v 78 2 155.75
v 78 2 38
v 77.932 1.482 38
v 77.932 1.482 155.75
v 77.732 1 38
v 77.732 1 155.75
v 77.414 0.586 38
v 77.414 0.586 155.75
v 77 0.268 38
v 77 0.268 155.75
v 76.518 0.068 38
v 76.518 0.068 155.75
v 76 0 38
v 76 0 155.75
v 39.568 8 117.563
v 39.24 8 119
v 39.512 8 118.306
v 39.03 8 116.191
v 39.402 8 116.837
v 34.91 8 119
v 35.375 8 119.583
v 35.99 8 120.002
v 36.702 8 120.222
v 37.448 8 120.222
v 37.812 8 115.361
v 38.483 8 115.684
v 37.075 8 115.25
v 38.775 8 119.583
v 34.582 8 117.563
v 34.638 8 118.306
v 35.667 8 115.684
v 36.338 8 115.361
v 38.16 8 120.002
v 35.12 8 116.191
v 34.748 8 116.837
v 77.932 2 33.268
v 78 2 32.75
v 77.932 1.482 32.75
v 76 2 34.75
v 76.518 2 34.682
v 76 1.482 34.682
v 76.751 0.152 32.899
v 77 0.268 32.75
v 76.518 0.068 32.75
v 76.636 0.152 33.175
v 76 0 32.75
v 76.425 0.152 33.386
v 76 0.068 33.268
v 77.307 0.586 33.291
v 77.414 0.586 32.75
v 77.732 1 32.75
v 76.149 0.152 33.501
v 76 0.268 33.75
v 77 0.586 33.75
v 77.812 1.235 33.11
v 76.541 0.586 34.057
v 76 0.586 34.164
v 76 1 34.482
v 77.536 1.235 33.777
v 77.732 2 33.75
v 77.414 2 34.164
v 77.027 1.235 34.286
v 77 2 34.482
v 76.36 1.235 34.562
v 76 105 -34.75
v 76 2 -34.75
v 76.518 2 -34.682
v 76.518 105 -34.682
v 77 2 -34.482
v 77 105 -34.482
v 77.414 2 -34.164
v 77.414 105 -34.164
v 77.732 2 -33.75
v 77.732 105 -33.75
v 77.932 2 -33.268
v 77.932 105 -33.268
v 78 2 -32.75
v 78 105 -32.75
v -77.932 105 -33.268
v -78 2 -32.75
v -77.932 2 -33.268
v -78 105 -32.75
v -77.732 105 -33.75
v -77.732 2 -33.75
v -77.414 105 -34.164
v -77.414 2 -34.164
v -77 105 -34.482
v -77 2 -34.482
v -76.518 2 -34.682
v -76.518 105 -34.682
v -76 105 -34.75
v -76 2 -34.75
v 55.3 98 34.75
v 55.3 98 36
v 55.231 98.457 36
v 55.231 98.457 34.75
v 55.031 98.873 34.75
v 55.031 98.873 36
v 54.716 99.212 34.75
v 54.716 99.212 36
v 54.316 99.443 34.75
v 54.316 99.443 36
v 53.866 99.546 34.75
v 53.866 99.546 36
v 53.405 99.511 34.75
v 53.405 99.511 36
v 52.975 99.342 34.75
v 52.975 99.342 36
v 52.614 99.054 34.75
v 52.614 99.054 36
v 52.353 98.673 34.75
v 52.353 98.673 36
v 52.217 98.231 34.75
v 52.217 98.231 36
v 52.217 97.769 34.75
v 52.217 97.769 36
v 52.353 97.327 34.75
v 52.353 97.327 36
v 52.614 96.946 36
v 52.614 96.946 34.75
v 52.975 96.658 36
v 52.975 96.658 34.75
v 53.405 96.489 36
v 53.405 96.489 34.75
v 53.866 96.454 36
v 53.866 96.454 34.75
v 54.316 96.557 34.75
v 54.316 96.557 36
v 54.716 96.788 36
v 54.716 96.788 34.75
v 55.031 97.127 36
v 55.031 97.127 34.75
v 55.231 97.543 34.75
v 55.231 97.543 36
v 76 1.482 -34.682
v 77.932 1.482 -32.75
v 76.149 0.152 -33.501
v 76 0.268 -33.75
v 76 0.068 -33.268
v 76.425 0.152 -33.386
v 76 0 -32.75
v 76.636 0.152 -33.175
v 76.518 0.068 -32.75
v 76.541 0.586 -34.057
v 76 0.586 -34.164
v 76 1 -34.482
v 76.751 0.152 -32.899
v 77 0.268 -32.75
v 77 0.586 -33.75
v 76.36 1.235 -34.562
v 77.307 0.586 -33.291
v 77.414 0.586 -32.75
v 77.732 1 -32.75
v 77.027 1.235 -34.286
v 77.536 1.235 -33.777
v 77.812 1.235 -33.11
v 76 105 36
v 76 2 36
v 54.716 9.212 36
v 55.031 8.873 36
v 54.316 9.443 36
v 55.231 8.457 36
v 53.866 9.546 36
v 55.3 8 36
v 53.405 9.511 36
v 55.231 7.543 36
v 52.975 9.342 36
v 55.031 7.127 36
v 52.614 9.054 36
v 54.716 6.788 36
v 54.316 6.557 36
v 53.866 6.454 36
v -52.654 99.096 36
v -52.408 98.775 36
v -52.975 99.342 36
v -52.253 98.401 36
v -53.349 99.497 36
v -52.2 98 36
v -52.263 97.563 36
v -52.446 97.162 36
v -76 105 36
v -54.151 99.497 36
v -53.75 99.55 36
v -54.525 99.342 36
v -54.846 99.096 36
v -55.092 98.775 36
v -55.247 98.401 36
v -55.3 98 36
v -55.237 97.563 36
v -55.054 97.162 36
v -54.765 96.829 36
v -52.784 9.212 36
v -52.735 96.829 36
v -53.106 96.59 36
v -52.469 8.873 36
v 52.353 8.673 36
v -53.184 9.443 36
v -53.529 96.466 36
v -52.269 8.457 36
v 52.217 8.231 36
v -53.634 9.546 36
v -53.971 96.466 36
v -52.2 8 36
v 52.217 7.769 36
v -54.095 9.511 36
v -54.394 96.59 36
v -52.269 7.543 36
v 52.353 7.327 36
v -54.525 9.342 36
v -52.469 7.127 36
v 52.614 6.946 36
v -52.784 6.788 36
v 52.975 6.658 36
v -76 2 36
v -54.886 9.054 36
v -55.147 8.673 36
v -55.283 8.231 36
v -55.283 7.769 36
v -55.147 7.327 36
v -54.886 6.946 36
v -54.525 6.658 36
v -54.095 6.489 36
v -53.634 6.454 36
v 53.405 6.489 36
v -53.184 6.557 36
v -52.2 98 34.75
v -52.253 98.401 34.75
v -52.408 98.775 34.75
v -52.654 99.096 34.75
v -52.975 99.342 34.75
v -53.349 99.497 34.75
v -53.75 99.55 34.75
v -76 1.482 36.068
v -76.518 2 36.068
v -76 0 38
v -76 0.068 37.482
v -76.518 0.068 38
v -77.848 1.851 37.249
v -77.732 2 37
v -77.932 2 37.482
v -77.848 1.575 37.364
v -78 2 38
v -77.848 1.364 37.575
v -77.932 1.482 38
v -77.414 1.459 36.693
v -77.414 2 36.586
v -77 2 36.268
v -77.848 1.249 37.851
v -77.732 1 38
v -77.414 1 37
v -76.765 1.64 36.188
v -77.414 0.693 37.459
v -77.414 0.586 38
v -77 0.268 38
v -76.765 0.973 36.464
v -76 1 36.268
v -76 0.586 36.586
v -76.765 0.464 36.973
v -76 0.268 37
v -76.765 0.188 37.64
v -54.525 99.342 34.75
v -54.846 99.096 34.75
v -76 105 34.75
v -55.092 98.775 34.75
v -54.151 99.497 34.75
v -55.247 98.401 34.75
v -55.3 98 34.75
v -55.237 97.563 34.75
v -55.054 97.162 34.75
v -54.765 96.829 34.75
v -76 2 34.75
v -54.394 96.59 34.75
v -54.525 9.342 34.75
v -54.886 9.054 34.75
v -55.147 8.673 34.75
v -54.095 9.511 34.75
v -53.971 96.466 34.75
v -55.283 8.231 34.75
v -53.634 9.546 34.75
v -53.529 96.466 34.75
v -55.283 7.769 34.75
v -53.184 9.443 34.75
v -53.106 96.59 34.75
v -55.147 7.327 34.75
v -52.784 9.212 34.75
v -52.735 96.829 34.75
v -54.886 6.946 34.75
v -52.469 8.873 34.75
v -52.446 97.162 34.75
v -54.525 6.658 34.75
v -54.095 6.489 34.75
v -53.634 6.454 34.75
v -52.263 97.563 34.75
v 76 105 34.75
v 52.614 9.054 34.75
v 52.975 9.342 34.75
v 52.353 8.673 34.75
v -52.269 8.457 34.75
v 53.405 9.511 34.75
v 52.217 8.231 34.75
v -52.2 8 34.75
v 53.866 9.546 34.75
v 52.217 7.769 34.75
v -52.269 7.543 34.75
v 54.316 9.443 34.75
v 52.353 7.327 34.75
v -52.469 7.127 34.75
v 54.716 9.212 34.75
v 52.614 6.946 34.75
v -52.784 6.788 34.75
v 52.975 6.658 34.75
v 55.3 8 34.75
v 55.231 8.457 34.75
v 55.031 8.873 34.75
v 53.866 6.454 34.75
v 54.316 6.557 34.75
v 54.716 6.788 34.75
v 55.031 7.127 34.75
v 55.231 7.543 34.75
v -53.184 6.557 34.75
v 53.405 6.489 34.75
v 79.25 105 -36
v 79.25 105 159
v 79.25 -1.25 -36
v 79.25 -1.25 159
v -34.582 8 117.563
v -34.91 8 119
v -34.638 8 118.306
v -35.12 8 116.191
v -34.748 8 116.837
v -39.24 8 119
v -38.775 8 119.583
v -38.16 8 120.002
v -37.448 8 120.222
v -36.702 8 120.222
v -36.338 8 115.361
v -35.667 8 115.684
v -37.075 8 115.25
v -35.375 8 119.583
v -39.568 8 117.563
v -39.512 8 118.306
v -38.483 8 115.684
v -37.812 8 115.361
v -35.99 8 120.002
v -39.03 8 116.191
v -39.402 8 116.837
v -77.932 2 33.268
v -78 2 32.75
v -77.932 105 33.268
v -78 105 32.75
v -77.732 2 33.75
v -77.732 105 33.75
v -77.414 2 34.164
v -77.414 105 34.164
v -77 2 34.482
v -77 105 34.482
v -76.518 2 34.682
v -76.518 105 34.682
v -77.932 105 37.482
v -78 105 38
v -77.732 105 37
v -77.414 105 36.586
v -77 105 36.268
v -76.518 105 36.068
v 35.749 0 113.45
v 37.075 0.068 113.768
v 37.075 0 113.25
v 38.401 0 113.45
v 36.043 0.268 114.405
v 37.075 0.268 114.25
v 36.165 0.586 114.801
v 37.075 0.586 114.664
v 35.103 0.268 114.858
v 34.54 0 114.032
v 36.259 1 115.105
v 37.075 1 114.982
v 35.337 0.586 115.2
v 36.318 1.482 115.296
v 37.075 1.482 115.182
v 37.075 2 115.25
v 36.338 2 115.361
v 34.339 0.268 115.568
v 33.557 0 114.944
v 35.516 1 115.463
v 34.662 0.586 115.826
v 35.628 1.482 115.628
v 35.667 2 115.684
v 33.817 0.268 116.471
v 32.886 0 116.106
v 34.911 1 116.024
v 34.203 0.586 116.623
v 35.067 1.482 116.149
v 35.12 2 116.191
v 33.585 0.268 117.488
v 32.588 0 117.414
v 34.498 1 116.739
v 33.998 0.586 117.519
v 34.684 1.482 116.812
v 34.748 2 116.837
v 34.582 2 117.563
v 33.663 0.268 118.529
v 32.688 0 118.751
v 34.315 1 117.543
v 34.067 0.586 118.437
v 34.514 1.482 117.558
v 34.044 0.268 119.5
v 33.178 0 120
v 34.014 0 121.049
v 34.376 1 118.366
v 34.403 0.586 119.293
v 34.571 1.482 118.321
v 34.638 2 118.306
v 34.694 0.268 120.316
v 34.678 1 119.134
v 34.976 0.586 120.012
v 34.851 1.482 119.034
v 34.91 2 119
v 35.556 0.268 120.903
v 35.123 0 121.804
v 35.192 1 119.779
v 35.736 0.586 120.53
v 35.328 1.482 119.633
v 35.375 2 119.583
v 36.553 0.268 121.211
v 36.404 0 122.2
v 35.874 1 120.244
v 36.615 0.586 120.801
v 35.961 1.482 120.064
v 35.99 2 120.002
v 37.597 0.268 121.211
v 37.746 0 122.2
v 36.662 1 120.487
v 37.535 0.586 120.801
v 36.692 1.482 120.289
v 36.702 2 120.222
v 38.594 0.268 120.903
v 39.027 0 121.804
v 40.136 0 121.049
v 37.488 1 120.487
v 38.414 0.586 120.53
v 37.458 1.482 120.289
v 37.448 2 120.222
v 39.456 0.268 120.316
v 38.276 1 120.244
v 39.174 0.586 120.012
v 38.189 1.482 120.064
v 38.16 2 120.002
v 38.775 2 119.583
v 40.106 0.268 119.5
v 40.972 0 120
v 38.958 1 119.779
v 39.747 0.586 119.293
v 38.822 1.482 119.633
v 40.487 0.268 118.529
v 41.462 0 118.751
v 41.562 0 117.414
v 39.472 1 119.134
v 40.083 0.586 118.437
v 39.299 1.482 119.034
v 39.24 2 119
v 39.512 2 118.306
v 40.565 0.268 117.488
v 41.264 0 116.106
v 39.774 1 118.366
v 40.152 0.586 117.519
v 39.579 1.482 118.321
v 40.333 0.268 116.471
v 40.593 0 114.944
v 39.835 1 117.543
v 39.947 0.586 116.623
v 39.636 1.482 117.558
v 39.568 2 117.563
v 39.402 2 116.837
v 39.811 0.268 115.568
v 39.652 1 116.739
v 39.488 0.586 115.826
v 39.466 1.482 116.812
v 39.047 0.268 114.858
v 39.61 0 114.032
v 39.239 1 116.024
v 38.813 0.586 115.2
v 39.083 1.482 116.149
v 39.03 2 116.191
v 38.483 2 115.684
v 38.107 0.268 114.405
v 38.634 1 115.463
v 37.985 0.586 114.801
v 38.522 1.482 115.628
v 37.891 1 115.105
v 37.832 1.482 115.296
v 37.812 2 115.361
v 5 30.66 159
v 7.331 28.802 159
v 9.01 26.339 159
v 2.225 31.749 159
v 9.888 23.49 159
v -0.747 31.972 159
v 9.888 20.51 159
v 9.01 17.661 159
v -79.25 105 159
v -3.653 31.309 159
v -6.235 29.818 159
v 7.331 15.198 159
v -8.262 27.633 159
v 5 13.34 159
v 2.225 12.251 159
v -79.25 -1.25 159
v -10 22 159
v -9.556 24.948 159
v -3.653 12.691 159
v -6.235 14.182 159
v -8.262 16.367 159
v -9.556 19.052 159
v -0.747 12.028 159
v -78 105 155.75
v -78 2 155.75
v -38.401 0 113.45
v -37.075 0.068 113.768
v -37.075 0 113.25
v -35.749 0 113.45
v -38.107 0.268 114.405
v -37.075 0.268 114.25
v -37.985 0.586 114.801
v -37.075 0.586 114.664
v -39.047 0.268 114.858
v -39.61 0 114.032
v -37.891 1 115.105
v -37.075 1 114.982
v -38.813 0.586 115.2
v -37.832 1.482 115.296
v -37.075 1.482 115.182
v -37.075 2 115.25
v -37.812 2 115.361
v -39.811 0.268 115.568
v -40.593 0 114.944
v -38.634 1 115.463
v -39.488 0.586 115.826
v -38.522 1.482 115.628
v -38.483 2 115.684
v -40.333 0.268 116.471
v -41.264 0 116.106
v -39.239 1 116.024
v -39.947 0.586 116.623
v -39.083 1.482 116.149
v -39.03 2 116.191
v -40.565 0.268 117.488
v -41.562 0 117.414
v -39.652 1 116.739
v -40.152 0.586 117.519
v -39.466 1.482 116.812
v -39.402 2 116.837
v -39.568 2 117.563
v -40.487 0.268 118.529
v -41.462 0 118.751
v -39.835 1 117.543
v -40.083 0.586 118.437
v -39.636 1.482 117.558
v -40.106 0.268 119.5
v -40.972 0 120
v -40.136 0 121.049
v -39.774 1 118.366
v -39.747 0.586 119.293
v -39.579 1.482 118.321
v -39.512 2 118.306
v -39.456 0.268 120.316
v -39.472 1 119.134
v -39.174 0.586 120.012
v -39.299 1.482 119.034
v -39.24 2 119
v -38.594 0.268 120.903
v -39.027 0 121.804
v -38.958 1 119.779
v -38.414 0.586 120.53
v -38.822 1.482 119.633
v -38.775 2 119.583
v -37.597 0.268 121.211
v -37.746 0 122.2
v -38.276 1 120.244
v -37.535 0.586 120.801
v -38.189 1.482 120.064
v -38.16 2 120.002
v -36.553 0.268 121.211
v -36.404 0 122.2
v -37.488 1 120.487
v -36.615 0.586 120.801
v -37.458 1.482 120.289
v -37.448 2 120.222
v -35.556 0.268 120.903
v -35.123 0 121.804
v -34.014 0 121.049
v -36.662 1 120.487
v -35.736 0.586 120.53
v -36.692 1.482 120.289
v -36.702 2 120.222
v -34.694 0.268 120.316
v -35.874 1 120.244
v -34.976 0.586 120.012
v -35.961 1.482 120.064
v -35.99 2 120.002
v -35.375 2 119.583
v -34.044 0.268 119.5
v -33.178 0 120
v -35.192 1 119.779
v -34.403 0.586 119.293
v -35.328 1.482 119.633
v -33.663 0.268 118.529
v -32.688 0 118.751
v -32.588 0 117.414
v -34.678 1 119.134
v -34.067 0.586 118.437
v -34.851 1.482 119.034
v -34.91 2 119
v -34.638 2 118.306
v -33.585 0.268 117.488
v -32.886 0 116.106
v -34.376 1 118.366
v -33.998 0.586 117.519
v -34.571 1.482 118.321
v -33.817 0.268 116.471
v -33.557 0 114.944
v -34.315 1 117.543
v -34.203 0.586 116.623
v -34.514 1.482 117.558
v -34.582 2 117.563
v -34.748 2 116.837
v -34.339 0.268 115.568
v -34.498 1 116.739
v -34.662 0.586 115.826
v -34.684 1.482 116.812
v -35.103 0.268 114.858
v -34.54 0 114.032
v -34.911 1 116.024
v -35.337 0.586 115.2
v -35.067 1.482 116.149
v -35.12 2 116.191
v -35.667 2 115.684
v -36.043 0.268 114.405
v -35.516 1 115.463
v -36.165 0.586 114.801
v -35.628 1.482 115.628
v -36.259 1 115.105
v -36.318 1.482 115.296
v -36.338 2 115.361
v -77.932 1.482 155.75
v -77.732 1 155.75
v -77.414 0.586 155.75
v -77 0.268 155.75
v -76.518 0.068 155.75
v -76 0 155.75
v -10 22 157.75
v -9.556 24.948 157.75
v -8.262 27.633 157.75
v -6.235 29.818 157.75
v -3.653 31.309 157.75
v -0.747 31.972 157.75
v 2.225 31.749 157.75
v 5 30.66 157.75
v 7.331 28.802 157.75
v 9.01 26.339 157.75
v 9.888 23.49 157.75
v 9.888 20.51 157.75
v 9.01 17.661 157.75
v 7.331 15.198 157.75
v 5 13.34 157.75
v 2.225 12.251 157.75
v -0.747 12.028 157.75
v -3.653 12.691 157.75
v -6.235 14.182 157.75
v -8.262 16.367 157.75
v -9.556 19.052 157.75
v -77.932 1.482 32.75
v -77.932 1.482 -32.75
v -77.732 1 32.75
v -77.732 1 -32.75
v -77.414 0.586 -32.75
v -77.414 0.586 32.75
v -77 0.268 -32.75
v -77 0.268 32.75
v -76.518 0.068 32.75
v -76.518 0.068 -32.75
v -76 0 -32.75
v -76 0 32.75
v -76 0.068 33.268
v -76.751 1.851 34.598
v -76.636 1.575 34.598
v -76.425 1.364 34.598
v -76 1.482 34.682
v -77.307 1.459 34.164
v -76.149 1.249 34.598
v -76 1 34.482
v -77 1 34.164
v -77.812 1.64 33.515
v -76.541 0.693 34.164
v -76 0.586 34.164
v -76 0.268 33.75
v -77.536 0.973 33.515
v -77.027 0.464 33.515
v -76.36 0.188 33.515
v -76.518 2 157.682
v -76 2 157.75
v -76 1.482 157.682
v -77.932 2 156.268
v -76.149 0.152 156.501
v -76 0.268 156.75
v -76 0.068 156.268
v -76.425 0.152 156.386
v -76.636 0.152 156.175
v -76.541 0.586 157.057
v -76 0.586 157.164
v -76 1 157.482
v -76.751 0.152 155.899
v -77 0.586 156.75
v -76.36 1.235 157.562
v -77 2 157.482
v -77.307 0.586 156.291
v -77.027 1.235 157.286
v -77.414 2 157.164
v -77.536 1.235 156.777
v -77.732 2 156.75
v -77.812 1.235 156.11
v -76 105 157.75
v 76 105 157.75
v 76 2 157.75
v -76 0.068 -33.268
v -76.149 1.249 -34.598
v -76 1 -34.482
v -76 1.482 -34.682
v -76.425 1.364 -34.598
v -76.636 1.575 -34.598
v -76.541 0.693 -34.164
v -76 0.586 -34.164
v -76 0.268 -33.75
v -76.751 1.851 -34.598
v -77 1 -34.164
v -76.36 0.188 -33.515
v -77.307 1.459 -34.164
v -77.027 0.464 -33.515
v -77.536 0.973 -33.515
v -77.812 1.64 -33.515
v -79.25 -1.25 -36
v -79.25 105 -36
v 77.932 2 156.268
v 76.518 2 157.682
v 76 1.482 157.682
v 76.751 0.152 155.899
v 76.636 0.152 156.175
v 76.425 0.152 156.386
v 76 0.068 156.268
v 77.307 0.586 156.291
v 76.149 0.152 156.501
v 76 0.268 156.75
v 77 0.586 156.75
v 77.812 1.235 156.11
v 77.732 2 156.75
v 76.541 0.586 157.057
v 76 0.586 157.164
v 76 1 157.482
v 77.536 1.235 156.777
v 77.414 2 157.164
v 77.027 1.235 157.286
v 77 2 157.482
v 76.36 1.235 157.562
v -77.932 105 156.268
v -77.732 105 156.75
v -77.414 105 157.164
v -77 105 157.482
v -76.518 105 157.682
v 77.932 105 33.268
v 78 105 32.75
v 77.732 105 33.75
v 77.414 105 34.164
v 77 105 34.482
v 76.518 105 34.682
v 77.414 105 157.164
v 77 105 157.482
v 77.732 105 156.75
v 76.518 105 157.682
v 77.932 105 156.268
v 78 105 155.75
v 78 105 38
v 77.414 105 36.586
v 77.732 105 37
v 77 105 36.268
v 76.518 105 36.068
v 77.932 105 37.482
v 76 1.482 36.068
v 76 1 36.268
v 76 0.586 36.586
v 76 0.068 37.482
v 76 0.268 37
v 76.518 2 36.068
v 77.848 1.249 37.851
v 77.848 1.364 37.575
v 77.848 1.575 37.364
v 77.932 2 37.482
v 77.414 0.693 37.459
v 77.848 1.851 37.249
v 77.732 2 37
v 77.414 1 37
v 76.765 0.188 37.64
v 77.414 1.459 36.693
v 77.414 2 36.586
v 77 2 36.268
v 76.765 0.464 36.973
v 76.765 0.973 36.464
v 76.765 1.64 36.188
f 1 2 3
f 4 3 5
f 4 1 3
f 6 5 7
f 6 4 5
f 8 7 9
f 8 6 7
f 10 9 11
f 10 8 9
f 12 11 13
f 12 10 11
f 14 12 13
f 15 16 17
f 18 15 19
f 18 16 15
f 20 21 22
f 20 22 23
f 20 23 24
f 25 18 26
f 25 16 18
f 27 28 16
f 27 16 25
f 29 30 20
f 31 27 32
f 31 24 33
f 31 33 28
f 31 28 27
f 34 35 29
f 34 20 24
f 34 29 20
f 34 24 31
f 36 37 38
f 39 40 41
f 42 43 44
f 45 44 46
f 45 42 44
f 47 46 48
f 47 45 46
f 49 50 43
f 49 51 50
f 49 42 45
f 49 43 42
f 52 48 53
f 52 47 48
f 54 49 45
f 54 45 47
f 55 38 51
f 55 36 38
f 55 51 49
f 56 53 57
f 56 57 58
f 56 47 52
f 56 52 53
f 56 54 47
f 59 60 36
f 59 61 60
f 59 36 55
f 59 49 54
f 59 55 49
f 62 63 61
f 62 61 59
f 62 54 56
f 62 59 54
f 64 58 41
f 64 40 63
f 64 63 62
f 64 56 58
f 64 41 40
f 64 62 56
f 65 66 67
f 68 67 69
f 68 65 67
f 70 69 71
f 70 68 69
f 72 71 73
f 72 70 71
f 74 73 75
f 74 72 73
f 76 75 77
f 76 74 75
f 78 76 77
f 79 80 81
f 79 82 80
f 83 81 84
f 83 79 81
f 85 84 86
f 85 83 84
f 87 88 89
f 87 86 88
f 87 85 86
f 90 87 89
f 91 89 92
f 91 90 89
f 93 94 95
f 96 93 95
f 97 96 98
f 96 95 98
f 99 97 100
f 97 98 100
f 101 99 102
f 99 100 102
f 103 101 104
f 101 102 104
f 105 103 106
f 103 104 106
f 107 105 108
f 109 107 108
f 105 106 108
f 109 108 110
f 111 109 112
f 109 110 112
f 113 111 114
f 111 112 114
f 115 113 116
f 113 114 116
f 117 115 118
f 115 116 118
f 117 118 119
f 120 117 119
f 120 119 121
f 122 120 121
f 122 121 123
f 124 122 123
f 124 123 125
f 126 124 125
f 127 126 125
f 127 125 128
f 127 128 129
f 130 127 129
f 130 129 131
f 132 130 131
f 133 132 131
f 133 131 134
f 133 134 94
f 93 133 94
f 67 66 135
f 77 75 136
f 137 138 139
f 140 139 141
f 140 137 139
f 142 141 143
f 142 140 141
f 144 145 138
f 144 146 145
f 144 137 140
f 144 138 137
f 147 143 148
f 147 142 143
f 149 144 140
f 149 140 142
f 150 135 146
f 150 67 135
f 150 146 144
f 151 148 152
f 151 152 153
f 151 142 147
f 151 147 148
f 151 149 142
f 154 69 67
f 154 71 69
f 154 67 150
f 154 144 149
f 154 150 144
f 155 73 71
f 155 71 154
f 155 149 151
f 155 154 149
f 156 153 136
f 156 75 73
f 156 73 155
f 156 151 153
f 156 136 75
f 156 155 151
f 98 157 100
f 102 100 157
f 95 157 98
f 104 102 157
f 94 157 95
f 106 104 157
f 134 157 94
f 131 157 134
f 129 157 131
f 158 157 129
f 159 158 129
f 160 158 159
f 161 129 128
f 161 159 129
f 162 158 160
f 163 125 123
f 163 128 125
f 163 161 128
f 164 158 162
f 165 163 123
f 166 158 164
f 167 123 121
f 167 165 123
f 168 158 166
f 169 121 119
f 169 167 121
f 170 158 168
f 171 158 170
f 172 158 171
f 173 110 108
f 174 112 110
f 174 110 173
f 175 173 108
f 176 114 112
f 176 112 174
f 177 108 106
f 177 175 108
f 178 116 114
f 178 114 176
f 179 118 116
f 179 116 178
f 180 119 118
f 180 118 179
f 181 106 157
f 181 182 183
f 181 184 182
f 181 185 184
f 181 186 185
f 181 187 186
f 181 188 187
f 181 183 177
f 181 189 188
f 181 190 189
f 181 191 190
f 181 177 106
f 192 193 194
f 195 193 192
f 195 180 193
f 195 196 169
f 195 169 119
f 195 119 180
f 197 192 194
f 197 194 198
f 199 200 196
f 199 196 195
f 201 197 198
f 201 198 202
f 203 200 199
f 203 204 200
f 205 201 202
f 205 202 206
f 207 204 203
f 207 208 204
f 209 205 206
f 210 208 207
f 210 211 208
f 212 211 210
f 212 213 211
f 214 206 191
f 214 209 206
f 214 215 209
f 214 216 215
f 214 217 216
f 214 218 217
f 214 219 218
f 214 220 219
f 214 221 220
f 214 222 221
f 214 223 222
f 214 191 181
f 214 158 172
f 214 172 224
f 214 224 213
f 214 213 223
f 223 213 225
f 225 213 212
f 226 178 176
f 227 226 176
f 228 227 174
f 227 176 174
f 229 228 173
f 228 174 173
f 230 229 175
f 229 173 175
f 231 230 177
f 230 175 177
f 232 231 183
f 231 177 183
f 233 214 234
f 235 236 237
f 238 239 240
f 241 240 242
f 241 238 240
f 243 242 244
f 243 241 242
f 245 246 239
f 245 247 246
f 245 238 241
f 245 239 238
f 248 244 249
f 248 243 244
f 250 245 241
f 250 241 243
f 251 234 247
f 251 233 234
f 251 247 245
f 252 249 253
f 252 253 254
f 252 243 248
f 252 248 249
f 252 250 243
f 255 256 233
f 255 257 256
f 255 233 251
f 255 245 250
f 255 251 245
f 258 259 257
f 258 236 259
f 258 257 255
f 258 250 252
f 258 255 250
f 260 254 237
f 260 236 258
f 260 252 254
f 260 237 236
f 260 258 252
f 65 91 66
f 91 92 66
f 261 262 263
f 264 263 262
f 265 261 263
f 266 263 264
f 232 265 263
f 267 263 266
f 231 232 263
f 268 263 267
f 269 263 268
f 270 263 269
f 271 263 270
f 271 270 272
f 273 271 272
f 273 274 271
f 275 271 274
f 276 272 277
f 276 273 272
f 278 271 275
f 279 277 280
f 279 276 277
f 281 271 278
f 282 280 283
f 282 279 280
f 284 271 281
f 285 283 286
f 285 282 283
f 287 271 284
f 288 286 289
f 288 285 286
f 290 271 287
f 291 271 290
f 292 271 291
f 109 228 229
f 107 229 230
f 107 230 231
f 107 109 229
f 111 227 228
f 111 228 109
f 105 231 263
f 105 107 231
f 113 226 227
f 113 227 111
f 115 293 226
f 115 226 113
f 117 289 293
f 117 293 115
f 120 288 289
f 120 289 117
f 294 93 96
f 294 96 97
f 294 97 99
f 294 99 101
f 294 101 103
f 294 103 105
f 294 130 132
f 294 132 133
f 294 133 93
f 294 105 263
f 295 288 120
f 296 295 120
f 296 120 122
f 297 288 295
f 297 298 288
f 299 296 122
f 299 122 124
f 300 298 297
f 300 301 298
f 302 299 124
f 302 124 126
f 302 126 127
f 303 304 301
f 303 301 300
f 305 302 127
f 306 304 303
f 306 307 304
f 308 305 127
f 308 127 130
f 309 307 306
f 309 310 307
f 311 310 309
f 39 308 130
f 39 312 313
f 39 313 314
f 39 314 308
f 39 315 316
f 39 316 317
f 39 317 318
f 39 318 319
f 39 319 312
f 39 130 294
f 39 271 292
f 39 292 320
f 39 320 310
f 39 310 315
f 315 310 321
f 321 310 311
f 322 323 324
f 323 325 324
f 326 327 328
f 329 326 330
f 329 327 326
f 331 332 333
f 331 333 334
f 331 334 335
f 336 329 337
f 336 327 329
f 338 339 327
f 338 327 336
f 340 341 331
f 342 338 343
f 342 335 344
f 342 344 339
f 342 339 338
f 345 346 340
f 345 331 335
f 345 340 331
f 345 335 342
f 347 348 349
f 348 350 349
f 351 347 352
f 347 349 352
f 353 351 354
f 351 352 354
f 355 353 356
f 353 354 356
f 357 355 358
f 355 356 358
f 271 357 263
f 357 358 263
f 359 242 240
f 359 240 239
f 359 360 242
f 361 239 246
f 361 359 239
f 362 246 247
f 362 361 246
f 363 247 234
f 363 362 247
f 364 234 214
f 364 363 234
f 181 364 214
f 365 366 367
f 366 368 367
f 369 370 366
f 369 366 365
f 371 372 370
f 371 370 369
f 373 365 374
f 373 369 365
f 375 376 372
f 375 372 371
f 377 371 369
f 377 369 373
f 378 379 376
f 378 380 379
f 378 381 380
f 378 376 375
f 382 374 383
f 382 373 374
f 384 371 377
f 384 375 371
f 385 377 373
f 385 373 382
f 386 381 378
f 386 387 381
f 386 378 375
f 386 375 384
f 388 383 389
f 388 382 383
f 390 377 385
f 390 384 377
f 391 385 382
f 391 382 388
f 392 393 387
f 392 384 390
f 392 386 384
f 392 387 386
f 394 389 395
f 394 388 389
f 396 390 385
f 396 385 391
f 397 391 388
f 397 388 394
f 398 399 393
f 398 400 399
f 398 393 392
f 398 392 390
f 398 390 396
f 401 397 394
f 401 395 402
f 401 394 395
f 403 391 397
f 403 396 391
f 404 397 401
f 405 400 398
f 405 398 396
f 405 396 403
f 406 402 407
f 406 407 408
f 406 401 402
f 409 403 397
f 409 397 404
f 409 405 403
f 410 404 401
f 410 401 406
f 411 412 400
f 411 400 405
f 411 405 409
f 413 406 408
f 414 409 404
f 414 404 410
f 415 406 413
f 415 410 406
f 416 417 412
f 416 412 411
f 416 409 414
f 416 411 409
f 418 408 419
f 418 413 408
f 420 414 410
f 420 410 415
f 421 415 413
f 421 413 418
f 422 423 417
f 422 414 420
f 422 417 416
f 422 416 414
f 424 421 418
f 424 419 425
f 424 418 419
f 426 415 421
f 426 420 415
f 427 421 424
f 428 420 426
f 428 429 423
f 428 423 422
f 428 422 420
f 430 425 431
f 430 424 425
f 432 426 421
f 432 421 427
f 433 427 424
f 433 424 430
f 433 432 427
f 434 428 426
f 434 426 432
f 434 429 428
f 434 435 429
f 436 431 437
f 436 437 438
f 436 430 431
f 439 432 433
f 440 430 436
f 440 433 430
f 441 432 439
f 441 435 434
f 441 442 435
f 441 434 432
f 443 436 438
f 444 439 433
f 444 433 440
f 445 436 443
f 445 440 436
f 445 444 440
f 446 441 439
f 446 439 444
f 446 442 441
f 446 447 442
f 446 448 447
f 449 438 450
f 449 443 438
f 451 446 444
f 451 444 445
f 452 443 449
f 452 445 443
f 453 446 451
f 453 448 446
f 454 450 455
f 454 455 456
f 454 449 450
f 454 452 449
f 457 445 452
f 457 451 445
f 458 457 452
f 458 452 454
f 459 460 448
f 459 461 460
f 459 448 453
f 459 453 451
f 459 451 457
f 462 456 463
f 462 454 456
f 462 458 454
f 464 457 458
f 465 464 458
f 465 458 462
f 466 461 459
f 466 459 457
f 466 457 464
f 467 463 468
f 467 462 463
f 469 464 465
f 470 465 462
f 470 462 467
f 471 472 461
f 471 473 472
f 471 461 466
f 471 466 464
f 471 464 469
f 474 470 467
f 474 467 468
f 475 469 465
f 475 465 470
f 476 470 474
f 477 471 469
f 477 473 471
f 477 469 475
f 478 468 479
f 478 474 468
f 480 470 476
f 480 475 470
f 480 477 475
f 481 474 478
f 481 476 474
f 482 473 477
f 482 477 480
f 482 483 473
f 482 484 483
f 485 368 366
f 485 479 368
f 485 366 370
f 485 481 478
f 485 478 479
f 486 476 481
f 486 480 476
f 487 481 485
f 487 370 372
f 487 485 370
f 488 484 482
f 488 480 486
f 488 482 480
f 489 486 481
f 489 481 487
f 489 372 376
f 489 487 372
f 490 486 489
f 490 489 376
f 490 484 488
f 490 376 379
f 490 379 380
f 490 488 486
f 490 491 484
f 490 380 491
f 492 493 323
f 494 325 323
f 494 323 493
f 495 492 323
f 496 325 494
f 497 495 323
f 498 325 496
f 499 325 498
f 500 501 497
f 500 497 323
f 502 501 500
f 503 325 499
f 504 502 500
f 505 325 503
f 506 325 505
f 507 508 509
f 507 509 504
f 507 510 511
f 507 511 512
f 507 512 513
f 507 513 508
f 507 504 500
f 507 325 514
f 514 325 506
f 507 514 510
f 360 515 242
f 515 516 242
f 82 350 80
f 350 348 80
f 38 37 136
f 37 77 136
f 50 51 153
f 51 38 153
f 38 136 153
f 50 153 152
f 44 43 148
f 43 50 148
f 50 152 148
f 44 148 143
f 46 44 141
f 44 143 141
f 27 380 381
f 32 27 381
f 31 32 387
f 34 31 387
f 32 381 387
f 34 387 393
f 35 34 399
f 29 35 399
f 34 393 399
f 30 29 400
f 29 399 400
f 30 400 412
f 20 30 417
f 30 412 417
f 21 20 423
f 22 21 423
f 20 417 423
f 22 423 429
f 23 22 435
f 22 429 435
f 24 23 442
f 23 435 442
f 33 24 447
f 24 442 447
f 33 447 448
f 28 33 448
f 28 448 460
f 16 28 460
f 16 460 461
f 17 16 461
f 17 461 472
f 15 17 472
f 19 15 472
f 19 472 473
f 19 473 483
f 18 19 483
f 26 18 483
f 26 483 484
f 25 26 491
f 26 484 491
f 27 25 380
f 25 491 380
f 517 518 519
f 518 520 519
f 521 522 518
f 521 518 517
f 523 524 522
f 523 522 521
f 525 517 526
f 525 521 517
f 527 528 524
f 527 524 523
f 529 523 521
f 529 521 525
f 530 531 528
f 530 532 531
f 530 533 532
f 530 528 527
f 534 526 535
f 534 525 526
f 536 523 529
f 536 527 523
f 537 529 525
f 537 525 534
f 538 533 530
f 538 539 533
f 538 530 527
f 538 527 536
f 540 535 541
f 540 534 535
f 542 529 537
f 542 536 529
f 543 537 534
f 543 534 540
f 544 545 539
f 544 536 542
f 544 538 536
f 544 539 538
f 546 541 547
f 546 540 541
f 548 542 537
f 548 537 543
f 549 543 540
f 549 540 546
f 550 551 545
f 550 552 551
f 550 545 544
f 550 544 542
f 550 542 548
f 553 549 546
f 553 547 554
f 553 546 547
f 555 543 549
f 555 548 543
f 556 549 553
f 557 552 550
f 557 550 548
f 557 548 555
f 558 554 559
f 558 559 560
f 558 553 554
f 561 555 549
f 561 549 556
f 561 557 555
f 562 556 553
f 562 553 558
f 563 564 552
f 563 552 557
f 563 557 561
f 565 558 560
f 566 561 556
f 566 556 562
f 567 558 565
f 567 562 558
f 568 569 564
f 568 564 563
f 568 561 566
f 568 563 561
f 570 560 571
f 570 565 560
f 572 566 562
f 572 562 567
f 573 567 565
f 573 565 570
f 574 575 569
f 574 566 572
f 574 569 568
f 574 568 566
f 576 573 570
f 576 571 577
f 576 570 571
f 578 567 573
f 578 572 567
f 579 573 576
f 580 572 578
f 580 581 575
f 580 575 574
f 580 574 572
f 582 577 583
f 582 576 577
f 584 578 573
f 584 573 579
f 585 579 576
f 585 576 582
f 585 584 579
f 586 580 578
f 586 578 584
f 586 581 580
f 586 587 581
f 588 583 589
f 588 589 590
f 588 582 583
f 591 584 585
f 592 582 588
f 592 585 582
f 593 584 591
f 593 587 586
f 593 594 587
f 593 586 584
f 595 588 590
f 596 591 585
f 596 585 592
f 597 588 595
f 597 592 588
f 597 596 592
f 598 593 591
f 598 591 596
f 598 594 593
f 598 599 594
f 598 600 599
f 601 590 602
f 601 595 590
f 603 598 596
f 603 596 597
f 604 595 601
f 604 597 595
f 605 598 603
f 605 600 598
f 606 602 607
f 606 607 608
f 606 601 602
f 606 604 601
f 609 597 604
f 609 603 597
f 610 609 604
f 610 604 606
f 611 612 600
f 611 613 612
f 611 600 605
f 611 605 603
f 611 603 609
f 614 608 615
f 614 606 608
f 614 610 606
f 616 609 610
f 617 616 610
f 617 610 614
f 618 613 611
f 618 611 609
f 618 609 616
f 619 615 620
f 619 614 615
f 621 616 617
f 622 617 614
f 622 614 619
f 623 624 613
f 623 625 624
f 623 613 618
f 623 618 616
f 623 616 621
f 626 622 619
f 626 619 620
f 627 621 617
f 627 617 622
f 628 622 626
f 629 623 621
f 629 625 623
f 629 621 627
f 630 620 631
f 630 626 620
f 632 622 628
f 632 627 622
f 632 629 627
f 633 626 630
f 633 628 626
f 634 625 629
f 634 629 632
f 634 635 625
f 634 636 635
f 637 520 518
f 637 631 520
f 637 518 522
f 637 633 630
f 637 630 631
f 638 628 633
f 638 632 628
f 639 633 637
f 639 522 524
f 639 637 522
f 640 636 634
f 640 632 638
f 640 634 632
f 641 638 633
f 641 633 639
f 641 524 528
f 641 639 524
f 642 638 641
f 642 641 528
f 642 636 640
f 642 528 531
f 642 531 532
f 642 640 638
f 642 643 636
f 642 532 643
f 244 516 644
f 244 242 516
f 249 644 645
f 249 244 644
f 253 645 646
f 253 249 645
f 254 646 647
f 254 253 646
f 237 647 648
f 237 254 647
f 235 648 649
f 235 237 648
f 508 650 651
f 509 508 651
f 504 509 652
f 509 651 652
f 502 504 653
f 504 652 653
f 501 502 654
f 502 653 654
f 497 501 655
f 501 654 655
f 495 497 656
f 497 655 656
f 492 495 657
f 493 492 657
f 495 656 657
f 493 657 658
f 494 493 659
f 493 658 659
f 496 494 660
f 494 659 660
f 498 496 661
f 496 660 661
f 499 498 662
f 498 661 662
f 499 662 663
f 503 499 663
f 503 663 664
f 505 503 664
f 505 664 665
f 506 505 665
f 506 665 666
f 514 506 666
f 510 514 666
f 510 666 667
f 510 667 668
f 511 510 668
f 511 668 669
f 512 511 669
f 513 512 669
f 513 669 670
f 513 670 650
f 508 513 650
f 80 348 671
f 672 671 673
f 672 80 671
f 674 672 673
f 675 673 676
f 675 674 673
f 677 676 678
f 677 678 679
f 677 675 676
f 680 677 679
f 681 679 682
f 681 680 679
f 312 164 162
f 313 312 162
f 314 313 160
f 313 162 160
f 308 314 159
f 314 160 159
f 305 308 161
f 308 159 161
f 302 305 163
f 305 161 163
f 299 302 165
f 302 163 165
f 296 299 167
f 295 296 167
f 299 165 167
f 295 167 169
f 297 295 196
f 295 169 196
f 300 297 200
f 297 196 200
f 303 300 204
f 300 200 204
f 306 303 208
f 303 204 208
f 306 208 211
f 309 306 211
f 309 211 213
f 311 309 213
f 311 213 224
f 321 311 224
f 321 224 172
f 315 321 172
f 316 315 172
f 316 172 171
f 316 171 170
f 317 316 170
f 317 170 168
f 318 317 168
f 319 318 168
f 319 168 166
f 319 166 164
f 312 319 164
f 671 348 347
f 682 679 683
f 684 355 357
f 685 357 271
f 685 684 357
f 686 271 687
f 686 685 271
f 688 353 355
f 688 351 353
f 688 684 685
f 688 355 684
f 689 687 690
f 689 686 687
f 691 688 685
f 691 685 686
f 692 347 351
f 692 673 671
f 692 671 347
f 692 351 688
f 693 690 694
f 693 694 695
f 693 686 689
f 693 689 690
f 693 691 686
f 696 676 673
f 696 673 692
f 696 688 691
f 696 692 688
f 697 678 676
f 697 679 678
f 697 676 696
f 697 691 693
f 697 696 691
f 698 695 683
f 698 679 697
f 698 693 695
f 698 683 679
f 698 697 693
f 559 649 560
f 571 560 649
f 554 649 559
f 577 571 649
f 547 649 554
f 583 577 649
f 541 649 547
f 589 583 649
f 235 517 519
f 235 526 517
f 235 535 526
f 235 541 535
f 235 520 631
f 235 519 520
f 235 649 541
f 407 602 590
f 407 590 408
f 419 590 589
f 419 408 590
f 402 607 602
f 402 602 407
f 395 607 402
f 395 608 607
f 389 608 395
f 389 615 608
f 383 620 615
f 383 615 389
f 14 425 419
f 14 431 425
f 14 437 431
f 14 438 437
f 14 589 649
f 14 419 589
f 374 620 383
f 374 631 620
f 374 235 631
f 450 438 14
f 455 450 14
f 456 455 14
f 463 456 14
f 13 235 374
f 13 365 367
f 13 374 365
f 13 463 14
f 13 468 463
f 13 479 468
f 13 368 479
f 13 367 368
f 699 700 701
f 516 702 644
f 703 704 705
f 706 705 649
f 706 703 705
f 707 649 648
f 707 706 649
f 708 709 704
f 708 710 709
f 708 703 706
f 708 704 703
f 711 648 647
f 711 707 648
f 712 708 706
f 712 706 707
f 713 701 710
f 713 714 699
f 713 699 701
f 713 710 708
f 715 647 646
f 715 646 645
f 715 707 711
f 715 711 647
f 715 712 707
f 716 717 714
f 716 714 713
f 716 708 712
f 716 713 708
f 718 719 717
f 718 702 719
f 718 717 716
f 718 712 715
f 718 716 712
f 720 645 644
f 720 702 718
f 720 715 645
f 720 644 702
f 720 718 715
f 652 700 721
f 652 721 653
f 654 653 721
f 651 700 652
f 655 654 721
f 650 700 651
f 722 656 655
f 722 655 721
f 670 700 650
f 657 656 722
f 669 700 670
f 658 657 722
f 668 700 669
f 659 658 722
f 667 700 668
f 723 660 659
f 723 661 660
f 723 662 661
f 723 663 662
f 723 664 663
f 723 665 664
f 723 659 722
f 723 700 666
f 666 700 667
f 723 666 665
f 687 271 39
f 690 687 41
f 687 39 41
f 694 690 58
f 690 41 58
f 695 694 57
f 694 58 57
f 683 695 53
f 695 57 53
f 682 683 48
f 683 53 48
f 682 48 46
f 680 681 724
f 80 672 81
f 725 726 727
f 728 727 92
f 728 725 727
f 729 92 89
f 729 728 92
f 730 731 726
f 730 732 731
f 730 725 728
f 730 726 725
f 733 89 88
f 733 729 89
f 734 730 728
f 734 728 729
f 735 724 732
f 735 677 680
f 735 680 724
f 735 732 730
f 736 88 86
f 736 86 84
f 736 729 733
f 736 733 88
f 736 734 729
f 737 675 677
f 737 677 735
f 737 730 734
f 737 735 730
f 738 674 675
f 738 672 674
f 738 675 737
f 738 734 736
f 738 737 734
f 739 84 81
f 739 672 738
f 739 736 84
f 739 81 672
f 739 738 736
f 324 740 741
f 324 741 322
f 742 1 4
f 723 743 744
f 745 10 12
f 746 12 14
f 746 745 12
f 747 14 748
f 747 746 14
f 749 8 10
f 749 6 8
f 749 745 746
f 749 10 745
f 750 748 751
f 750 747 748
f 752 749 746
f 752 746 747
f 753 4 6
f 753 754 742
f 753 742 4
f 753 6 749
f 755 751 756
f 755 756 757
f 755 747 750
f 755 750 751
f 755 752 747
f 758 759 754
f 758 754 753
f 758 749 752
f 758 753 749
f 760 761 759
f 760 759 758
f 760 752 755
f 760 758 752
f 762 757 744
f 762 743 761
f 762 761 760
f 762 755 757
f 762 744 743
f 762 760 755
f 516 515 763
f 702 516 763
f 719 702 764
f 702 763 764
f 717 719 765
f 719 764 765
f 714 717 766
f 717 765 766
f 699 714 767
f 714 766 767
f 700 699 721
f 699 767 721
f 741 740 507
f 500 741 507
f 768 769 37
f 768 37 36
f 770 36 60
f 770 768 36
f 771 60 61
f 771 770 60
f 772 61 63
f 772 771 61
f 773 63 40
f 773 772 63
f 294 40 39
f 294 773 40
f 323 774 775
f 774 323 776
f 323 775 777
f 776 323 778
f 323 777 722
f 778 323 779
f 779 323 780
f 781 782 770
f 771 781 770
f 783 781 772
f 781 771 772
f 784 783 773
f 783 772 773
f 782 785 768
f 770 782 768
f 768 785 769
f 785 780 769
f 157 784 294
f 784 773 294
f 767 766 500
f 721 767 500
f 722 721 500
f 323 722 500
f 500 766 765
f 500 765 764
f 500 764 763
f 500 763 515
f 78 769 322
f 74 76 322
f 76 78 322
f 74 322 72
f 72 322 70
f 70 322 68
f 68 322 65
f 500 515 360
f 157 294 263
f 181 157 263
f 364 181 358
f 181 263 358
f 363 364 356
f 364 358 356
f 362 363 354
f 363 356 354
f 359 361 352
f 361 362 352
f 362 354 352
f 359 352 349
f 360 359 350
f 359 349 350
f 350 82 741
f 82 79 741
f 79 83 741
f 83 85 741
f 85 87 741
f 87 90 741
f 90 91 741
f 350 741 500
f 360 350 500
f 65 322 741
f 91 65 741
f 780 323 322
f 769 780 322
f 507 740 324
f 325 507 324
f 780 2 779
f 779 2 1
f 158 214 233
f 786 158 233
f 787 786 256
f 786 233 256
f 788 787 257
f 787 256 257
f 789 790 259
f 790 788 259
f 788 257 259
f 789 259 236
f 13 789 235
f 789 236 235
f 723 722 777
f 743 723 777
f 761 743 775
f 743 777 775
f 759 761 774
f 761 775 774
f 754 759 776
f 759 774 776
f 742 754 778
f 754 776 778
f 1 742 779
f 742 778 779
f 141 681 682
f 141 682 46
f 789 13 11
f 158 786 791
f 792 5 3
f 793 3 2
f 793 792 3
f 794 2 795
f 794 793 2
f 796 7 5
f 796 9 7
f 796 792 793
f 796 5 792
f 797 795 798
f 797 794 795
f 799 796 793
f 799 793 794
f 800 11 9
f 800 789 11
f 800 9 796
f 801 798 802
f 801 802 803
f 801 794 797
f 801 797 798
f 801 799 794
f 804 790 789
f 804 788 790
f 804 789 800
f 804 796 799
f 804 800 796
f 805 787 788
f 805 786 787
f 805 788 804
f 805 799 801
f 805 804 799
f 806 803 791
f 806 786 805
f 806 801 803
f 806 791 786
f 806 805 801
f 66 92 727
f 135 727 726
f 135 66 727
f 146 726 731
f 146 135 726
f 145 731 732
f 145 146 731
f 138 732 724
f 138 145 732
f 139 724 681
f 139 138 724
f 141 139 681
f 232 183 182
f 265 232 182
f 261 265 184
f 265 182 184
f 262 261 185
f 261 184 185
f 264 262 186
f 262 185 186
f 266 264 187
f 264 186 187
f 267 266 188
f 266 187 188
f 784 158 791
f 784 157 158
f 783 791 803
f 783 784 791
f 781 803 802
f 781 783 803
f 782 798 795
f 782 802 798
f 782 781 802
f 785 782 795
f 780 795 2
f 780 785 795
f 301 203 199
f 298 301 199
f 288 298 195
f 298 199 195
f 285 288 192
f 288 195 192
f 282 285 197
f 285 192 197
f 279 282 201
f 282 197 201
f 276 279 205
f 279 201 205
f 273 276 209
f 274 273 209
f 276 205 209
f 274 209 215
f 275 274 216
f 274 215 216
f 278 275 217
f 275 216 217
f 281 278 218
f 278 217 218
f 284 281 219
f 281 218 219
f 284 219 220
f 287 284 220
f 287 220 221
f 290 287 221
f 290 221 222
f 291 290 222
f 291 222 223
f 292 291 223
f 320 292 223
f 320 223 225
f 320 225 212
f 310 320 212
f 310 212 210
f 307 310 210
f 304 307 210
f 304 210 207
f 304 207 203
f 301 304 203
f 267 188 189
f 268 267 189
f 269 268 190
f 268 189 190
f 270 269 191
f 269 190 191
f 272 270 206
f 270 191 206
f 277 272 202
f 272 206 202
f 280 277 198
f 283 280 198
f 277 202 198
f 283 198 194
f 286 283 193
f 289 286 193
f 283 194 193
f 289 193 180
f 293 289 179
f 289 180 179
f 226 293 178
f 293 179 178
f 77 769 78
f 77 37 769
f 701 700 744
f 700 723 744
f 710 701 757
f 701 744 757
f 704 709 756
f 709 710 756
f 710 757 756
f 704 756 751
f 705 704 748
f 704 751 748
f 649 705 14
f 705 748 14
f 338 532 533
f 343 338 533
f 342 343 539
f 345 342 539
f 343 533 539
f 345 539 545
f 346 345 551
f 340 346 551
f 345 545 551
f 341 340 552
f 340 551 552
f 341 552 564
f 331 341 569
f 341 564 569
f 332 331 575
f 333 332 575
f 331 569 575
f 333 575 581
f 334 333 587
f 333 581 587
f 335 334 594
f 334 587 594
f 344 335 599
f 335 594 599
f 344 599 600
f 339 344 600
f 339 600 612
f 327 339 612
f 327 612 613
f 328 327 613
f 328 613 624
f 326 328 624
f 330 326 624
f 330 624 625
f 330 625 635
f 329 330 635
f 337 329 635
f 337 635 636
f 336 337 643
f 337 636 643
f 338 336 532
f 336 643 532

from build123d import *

# Parameters (mm, degrees)
SKETCH2_W           = 158.5
SKETCH2_H           = 195
BOSS_EXTRUDE1_DEPTH = 1.25
SKETCH1_W           = 156
SKETCH1_H           = 69.5
BOSS_EXTRUDE2_DEPTH = 105
SKETCH4_R           = 2.5
BOSS_EXTRUDE3_DEPTH = 8
FILLET2_R           = 2
SKETCH5_R           = 1.55
CUT_EXTRUDE1_DEPTH  = 8
SKETCH6_R           = 10
CUT_EXTRUDE2_DEPTH  = 8


with BuildPart() as part:
    # Sketch2 → Boss-Extrude1 (new body)
    with BuildSketch(Plane(origin=(0, 0, 0), x_dir=(1, 0, 0), z_dir=(0, 1, 0))):
        with Locations((0, -61.5)):
            Rectangle(SKETCH2_W, SKETCH2_H)
    extrude(amount=-BOSS_EXTRUDE1_DEPTH)

    # Sketch1 → Boss-Extrude2 (add)
    with BuildSketch(Plane(origin=(0, 0, 0), x_dir=(1, 0, 0), z_dir=(0, 1, 0))):
        Polygon((79.25, -159), (-79.25, -159), (-79.25, -86), (-79.25, -36), (-79.25, 36), (79.25, 36), (79.25, -36), (79.25, -86), align=None)
        Polygon((-78, -157.75), (78, -157.75), (78, -86), (78, -36), (-78, -36), (-78, -86), (-78, -100.588597569), align=None, mode=Mode.SUBTRACT)
        Rectangle(SKETCH1_W, SKETCH1_H, mode=Mode.SUBTRACT)
    extrude(amount=BOSS_EXTRUDE2_DEPTH)

    # Sketch4 → Boss-Extrude3 (add)
    with BuildSketch(Plane(origin=(0, 0, 0), x_dir=(1, 0, 0), z_dir=(0, 1, 0))):
        with Locations(Location((-37.075, -117.75, 0), (0, 0, 90))):
            Circle(SKETCH4_R)
        with Locations(Location((37.075, -117.75, 0), (0, 0, 90))):
            Circle(SKETCH4_R)
    extrude(amount=BOSS_EXTRUDE3_DEPTH)

    # Fillet2
    fillet2_edges = [part.edges().sort_by_distance(p)[0] for p in [
        (78, 52.5, -34.75),
        (78, 52.5, 34.75),
        (-78, 0, 0),
        (-78, 52.5, 34.75),
        (78, 52.5, 157.75),
        (-78, 52.5, 157.75),
        (0, 0, 36),
        (-78, 52.5, 36),
        (78, 0, 96.875),
        (78, 52.5, 36),
        (0, 0, -34.75),
        (-78, 52.5, -34.75),
        (0, 0, 157.75),
        (-78, 0, 96.875),
        (78, 0, 0),
        (0, 0, 34.75),
        (-37.075, 0, 120.25),
        (37.075, 0, 120.25),
    ]]
    fillet(fillet2_edges, radius=FILLET2_R)

    # Sketch5 → Cut-Extrude1 (cut)
    with BuildSketch(Plane.XY.offset(36)):
        with BuildLine():
            ThreePointArc((-53.75, 99.55), (-54.846015511, 99.096015511), (-55.3, 98))
            Line((-55.3, 98), (-53.75, 98))
            Line((-53.75, 98), (-53.75, 99.55))
        make_face()
        with BuildLine():
            Line((-53.75, 98), (-55.3, 98))
            ThreePointArc((-55.3, 98), (-53.75, 96.45), (-52.2, 98))
            ThreePointArc((-52.2, 98), (-52.653984489, 99.096015511), (-53.75, 99.55))
            Line((-53.75, 99.55), (-53.75, 98))
        make_face()
        with Locations((53.75, 98)):
            Circle(SKETCH5_R)
        with Locations((-53.75, 8)):
            Circle(SKETCH5_R)
        with Locations((53.75, 8)):
            Circle(SKETCH5_R)
    extrude(amount=-CUT_EXTRUDE1_DEPTH, mode=Mode.SUBTRACT)

    # Sketch6 → Cut-Extrude2 (cut)
    with BuildSketch(Plane(origin=(0, 0, 157.75), x_dir=(-1, 0, 0), z_dir=(0, 0, -1))):
        with Locations((0, 22)):
            Circle(SKETCH6_R)
    extrude(amount=-CUT_EXTRUDE2_DEPTH, mode=Mode.SUBTRACT)


solid = part.part
